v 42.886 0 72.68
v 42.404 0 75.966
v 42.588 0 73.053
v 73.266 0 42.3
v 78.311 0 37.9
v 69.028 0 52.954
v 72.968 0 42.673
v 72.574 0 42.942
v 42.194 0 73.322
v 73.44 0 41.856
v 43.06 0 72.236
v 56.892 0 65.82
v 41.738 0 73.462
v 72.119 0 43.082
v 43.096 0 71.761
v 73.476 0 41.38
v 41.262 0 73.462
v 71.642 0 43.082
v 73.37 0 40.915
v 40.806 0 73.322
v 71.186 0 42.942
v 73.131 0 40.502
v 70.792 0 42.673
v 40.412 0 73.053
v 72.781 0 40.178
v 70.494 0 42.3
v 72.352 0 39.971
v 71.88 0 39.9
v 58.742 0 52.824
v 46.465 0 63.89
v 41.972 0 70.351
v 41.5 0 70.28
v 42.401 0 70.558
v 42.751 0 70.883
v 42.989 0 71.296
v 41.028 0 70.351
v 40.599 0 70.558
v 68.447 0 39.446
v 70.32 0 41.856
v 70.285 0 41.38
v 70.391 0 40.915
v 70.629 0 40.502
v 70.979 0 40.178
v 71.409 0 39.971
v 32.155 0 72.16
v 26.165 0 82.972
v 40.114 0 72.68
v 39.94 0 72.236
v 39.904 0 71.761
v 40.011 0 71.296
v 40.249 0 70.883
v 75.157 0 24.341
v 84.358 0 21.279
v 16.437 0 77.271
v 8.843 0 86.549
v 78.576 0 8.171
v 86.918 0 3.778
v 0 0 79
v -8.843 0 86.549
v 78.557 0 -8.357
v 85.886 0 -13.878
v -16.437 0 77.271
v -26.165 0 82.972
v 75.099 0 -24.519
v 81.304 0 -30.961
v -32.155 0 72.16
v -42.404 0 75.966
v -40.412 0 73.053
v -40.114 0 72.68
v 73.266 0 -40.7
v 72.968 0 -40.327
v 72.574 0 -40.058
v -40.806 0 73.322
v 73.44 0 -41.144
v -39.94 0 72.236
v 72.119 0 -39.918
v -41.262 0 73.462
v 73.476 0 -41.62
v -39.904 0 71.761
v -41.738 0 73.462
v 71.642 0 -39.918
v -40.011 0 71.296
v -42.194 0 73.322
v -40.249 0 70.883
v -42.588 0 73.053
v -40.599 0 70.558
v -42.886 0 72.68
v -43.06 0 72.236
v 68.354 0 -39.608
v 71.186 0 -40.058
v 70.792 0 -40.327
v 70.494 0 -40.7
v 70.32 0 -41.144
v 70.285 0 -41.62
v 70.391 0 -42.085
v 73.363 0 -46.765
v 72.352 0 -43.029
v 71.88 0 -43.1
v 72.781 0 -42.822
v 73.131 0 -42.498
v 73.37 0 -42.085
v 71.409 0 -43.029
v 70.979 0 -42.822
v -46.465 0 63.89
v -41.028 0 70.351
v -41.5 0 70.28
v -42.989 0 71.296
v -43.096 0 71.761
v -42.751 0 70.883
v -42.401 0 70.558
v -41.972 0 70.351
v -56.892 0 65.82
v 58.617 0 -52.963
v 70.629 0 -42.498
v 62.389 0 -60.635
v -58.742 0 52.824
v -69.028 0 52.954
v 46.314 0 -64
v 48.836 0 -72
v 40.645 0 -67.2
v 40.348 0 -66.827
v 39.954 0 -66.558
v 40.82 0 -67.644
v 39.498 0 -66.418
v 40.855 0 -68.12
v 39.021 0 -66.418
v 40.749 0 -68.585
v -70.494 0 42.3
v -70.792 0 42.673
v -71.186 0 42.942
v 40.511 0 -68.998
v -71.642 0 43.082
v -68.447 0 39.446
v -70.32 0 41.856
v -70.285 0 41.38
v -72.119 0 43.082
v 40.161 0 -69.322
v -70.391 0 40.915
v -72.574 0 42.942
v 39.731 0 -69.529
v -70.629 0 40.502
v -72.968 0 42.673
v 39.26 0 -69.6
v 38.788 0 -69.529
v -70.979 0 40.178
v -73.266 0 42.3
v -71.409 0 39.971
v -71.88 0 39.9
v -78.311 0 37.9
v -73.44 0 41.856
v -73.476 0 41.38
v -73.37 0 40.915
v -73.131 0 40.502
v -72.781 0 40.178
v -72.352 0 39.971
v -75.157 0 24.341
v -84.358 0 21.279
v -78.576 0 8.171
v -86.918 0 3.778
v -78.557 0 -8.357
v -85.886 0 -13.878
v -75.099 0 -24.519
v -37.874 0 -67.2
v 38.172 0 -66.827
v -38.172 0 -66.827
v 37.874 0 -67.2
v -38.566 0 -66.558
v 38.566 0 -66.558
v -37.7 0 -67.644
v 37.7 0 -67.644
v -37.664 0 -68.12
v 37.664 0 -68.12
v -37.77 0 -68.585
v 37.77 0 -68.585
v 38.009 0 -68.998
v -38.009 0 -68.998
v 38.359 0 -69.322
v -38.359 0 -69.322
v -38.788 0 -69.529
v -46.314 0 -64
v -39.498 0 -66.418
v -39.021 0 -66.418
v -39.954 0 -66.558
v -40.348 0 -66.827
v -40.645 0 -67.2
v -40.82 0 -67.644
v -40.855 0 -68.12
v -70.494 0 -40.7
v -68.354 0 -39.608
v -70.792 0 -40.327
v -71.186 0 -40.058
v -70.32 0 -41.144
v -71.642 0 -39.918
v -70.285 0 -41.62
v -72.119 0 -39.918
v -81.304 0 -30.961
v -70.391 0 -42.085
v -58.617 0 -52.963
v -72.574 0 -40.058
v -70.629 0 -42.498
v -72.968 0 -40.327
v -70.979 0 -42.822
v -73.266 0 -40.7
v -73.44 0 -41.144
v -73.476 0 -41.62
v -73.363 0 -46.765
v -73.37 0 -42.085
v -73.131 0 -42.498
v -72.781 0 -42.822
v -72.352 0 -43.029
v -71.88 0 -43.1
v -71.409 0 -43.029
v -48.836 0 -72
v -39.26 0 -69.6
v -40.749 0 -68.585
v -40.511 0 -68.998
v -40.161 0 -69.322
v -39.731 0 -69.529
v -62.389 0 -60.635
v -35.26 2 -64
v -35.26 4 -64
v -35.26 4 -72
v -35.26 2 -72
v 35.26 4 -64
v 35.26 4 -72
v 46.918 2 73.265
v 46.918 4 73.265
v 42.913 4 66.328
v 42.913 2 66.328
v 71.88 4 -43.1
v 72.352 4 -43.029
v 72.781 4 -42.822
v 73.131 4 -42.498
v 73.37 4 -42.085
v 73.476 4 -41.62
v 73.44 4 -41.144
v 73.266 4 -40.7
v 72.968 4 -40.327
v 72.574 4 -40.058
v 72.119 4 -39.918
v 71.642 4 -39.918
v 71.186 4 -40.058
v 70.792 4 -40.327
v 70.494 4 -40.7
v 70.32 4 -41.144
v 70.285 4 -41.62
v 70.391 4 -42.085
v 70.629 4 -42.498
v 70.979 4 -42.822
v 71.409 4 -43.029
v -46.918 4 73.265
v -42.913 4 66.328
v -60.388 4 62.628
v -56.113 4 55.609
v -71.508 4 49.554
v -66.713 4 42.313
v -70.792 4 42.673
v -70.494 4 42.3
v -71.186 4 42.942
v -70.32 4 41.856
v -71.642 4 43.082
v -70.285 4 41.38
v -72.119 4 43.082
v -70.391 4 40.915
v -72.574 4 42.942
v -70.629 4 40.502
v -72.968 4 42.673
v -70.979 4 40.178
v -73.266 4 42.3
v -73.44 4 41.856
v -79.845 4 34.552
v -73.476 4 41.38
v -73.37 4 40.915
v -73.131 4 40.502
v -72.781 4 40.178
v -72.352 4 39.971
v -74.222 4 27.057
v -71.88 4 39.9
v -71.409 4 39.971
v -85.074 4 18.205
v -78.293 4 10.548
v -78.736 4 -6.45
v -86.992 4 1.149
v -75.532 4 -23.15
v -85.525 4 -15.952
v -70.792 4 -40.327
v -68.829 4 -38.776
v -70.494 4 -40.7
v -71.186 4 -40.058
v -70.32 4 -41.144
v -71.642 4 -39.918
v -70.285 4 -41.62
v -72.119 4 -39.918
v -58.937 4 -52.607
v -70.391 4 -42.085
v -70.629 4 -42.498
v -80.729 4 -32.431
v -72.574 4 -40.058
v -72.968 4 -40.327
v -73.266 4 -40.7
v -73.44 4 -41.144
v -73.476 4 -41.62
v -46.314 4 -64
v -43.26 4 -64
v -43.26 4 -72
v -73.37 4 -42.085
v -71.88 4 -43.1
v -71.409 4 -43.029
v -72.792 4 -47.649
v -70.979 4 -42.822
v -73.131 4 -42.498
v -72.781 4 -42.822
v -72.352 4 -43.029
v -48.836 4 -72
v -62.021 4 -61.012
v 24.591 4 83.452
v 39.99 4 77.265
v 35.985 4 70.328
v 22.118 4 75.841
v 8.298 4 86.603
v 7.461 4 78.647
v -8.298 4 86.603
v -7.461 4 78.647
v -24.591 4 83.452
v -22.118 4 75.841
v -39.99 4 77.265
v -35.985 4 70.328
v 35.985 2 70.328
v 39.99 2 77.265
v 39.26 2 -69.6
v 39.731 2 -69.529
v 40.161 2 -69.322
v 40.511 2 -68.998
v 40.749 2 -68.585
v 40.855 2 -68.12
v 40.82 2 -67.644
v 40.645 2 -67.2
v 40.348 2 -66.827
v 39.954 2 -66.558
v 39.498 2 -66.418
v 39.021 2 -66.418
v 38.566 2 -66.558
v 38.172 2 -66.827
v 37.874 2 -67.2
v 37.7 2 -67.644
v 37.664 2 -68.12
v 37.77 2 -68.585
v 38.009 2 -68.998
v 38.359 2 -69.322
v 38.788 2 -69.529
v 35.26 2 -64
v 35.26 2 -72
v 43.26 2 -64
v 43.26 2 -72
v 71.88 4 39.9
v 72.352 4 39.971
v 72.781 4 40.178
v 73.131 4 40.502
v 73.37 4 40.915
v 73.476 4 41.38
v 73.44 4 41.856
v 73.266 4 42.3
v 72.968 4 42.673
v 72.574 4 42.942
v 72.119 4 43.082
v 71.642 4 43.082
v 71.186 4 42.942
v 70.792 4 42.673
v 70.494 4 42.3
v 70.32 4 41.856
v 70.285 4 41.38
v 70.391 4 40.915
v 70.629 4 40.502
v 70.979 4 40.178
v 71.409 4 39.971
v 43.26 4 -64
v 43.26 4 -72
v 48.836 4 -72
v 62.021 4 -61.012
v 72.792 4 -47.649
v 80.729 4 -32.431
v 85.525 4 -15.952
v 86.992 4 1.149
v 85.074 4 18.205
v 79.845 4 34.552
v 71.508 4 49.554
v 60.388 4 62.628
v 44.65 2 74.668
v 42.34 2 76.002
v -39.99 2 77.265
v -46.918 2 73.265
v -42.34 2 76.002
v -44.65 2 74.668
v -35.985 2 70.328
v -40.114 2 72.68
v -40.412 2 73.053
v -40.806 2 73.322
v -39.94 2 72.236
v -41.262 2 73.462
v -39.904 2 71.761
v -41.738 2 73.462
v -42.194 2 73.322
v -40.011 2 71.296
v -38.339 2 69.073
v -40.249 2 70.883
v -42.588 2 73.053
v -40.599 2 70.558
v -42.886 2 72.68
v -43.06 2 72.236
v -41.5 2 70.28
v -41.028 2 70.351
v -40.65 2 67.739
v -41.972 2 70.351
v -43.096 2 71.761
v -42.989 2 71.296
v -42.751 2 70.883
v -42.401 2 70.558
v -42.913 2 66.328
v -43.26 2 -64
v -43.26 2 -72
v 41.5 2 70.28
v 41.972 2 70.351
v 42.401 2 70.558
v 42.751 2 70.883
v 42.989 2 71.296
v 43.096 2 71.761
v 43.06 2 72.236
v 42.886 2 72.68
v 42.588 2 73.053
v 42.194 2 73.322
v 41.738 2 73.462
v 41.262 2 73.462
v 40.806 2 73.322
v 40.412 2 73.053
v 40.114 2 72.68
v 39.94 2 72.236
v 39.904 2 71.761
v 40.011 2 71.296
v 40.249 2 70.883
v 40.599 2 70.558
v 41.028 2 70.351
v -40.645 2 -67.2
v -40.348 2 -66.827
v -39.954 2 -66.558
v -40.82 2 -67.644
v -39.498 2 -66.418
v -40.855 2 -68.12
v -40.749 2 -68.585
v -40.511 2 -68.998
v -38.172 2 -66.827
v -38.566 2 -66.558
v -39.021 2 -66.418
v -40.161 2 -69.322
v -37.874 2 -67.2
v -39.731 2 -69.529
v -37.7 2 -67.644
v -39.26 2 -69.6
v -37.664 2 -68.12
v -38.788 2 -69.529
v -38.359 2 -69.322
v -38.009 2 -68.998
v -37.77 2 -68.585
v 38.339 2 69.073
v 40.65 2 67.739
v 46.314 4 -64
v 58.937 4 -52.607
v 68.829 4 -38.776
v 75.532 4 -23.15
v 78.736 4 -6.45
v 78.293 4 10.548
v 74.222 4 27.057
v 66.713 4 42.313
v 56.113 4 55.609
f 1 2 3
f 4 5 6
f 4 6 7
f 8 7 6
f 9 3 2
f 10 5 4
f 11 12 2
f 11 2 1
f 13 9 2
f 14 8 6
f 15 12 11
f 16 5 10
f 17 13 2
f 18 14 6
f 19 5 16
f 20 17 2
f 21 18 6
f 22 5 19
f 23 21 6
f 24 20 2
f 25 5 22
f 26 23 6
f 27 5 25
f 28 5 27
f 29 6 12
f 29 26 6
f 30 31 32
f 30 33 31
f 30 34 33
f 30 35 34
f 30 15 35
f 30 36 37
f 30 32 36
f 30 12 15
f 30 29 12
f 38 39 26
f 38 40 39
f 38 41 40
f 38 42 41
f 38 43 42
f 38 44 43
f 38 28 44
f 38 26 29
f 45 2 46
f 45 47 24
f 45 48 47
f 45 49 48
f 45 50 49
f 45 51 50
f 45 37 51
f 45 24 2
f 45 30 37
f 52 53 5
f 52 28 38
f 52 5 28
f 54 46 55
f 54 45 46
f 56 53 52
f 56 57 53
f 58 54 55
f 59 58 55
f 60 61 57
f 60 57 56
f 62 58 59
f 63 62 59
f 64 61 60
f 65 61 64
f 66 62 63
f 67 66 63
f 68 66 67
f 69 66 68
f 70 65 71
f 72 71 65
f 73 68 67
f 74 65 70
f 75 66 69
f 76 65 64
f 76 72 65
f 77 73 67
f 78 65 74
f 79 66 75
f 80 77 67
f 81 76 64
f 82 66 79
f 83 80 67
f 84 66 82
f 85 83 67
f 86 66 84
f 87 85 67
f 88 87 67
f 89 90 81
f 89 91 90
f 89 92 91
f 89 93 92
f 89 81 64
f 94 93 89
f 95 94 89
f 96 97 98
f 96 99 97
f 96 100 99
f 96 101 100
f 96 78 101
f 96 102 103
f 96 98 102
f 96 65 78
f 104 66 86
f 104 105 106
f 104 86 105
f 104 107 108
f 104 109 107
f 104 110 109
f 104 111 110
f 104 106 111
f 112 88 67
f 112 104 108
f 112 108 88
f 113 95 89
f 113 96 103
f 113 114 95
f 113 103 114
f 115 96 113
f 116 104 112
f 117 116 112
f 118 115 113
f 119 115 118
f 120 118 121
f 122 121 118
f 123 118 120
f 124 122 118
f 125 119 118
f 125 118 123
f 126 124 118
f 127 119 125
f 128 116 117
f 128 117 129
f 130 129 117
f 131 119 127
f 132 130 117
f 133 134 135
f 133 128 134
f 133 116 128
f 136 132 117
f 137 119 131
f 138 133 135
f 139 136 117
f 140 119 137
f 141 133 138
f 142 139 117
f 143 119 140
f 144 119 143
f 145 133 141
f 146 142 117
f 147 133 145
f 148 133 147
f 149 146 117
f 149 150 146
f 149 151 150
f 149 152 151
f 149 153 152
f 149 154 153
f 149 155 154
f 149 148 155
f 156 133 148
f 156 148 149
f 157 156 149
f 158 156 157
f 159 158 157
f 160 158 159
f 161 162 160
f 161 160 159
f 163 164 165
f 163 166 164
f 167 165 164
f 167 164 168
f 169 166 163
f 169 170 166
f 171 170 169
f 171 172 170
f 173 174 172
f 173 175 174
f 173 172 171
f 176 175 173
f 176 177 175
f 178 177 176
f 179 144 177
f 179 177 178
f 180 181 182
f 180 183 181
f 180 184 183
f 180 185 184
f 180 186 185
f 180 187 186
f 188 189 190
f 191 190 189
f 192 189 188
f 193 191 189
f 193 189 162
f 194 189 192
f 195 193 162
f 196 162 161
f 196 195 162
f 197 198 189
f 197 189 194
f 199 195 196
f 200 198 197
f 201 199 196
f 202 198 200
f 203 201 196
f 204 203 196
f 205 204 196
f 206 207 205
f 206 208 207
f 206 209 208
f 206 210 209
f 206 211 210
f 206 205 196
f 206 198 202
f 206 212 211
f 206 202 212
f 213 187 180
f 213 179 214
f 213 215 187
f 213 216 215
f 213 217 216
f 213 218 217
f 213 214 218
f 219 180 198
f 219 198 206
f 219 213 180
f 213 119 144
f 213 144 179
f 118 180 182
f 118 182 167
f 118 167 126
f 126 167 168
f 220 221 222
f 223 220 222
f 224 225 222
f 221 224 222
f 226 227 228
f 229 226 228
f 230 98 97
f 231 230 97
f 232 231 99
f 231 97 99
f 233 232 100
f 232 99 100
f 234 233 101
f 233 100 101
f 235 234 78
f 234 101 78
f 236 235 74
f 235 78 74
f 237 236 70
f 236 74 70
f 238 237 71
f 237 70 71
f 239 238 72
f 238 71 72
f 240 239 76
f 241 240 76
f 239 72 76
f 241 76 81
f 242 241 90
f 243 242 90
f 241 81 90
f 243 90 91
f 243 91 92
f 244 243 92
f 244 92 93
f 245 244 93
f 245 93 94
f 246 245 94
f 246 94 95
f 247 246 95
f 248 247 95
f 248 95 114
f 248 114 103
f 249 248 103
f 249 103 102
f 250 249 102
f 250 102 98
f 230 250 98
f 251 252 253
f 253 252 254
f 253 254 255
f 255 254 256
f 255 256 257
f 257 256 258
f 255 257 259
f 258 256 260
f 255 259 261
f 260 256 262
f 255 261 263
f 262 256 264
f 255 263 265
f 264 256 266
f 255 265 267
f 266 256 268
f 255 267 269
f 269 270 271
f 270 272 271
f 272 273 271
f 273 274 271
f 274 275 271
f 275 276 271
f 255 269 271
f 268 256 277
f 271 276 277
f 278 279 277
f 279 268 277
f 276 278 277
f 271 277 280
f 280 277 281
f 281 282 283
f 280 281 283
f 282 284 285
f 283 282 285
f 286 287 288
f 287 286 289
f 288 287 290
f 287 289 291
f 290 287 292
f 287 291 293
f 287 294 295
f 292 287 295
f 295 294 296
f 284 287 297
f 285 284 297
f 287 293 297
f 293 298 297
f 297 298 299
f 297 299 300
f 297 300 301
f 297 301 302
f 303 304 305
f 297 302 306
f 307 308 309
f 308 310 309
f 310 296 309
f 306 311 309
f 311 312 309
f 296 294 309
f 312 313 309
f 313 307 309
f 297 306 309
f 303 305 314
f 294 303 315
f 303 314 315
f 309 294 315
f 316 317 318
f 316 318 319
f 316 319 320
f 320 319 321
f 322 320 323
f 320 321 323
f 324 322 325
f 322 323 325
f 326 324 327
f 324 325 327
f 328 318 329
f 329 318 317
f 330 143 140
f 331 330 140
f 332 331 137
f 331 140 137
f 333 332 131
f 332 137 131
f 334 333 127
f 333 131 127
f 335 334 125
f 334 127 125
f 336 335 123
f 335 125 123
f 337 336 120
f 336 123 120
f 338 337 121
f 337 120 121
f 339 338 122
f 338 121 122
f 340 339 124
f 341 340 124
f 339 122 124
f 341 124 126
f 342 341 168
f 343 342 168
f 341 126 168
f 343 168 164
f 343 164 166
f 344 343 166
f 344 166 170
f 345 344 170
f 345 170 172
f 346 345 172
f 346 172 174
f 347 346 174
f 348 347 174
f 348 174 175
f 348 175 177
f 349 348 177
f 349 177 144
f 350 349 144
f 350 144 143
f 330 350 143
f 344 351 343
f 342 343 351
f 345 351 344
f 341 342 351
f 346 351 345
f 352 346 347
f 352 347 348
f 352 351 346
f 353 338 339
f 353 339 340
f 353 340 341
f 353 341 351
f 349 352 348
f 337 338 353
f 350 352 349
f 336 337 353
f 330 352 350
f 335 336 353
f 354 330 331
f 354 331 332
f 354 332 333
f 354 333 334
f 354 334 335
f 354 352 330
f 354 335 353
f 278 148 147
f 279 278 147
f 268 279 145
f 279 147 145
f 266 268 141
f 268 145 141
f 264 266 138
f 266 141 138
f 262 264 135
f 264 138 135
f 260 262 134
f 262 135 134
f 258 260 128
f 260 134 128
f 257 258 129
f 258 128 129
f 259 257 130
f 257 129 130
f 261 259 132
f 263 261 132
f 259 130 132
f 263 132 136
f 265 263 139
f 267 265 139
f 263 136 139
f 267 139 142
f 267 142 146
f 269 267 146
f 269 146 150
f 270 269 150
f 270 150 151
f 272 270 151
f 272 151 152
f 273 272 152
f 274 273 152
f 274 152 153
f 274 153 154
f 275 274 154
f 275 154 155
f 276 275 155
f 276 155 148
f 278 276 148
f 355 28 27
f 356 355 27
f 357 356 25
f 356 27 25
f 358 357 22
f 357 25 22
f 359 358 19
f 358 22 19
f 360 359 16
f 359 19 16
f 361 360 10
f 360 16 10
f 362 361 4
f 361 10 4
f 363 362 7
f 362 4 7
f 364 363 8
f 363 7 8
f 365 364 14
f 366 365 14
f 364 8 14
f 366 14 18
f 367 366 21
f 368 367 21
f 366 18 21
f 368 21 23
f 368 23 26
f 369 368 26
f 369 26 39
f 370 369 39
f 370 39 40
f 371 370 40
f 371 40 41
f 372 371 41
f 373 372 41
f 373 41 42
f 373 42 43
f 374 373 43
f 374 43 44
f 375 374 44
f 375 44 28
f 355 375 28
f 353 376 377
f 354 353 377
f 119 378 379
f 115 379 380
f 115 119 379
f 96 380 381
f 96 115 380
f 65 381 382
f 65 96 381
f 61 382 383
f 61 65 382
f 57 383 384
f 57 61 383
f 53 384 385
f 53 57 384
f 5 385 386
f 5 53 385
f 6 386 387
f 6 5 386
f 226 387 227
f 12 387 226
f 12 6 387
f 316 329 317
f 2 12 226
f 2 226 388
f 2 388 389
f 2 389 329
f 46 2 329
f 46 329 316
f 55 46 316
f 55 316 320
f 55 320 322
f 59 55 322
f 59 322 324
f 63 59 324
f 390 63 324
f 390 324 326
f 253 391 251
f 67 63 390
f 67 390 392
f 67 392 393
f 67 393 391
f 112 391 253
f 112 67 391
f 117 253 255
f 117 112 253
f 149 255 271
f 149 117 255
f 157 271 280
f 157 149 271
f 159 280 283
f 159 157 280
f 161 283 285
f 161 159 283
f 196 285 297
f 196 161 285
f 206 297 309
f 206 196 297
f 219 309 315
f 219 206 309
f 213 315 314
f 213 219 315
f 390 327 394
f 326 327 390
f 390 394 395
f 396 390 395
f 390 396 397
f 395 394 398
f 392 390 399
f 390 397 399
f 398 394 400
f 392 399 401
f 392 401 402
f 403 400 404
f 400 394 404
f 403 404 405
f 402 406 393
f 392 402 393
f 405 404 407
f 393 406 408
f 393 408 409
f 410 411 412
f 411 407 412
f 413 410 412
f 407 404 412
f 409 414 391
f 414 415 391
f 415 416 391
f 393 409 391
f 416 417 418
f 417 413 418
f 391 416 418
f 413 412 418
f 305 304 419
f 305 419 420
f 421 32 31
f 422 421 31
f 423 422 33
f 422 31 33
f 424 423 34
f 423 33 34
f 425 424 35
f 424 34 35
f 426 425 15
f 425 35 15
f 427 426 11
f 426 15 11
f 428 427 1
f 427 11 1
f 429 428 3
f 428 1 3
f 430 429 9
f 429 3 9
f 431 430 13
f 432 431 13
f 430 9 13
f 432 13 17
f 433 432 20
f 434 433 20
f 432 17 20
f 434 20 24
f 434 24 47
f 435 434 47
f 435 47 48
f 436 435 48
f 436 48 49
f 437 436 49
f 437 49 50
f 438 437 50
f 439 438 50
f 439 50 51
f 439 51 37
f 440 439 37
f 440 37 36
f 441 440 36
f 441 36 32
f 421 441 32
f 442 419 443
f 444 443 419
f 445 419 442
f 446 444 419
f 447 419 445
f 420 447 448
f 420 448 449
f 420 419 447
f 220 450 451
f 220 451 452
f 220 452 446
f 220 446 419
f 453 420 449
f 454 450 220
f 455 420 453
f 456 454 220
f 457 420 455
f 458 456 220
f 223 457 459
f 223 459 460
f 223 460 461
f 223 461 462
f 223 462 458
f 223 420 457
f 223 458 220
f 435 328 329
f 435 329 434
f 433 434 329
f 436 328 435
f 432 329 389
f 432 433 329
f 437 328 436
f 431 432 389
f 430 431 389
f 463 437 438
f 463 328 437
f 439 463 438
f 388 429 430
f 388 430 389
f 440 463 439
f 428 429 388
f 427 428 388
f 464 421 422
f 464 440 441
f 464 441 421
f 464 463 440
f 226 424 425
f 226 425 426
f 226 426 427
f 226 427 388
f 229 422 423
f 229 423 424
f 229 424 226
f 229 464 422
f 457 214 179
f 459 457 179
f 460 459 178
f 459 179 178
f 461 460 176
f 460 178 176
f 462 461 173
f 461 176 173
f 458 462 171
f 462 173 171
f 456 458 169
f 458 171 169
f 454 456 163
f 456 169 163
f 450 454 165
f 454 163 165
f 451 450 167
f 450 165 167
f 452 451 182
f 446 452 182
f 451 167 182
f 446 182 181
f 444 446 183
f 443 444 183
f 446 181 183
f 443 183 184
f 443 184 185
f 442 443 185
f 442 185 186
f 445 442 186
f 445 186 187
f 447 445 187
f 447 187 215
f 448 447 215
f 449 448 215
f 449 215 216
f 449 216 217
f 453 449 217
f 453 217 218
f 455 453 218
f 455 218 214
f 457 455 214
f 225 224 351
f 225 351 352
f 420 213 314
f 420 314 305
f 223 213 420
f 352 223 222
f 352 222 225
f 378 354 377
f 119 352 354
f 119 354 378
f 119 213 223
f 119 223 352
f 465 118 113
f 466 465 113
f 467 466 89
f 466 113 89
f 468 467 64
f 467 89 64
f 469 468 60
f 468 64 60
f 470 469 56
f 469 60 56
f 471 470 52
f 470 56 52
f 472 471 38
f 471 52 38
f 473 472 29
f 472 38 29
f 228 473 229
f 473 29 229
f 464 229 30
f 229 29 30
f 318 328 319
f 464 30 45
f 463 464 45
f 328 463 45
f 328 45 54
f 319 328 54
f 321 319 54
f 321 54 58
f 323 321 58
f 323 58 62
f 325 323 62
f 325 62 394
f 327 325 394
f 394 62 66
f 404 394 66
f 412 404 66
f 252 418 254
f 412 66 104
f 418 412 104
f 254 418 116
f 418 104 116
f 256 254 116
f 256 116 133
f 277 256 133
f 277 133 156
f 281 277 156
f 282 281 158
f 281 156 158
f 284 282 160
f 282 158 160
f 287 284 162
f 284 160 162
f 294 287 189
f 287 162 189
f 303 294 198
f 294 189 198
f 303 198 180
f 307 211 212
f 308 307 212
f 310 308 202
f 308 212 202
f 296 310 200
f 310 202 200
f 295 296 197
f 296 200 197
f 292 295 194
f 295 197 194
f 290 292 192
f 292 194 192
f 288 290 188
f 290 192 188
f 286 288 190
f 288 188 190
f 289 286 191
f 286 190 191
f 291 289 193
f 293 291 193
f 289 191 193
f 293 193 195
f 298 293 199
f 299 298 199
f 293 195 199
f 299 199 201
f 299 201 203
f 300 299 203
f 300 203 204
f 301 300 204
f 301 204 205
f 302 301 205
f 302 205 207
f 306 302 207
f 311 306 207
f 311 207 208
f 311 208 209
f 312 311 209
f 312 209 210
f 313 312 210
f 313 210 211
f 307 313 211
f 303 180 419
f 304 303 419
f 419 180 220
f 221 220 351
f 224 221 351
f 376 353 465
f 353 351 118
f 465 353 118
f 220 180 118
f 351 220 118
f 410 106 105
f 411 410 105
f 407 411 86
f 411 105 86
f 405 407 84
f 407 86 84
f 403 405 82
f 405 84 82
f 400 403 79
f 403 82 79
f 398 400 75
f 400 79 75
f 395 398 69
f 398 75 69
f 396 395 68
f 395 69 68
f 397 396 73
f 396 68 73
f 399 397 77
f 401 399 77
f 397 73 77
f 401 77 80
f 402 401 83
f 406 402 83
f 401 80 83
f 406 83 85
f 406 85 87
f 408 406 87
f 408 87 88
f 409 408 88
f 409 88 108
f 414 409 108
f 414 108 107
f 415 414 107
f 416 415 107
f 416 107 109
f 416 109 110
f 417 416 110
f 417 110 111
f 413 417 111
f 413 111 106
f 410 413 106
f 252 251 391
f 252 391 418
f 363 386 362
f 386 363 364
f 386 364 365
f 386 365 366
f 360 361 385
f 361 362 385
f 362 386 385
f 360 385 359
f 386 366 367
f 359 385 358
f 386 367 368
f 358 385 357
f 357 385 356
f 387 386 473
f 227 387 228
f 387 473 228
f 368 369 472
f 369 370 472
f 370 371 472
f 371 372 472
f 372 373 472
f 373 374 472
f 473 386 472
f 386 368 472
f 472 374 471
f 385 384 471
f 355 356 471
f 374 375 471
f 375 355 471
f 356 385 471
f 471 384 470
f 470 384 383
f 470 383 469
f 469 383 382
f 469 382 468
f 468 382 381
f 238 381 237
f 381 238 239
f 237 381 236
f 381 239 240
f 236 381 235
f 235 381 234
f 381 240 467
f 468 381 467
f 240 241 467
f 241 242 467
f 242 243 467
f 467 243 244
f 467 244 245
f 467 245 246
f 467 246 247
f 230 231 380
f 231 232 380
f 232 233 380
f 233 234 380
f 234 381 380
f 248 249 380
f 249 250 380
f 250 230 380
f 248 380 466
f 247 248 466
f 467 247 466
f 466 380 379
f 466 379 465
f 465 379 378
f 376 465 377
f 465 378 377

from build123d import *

# Parameters (mm, degrees)
BOSS_EXTRUDE1_DEPTH  = 4
SKETCH2_W            = 8
SKETCH2_H            = 8
CUT_EXTRUDE1_DEPTH   = 2
M3_CLEARANCE_HOLE1_D = 3.2


with BuildPart() as part:
    # Sketch1 → Boss-Extrude1 (new body)
    with BuildSketch(Plane(origin=(0, 0, 0), x_dir=(1, 0, 0), z_dir=(0, 1, 0))):
        with BuildLine():
            Line((-48.836461788, 72), (48.836461788, 72))
            ThreePointArc((48.836461788, 72), (0, -87), (-48.836461788, 72))
        make_face()
        with BuildLine():
            Line((-46.314144708, 64), (46.314144708, 64))
            ThreePointArc((46.314144708, 64), (0, -79), (-46.314144708, 64))
        make_face(mode=Mode.SUBTRACT)
    extrude(amount=BOSS_EXTRUDE1_DEPTH)

    # Sketch2 → Cut-Extrude1 (cut)
    with BuildSketch(Plane(origin=(0, 4, 0), x_dir=(1, 0, 0), z_dir=(0, 1, 0))):
        with Locations((-39.259818305, 68)):
            Rectangle(SKETCH2_W, SKETCH2_H)
        with Locations((39.259818305, 68)):
            Rectangle(SKETCH2_W, SKETCH2_H)
        Polygon((-53.75822561, -85.111978082), (-34.446229734, -51.662620029), (-27.518026504, -55.662620029), (-46.83002238, -89.111978082), align=None)
    cut_extrude1 = extrude(amount=-CUT_EXTRUDE1_DEPTH, mode=Mode.SUBTRACT)

    # Mirror1: Cut-Extrude1 across plane
    add(cut_extrude1.mirror(Plane(origin=(0, 0, 0), x_dir=(0, 0, 1), z_dir=(1, 0, 0))), mode=Mode.SUBTRACT)

    # M3 Clearance Hole1 (through all)
    with Locations(Plane(origin=(71.880108514, 4, 41.5), x_dir=(0, 0, 1), z_dir=(0, 1, 0))):
        with Locations((0, 0), (30.380108514, -30.380108514), (30.380108514, -113.380108514), (-83, -143.760217028), (0, -143.760217028), (-83, 0), (-109.5, -111.139926819), (-109.5, -32.620290209)):
            Hole(M3_CLEARANCE_HOLE1_D / 2)


solid = part.part
